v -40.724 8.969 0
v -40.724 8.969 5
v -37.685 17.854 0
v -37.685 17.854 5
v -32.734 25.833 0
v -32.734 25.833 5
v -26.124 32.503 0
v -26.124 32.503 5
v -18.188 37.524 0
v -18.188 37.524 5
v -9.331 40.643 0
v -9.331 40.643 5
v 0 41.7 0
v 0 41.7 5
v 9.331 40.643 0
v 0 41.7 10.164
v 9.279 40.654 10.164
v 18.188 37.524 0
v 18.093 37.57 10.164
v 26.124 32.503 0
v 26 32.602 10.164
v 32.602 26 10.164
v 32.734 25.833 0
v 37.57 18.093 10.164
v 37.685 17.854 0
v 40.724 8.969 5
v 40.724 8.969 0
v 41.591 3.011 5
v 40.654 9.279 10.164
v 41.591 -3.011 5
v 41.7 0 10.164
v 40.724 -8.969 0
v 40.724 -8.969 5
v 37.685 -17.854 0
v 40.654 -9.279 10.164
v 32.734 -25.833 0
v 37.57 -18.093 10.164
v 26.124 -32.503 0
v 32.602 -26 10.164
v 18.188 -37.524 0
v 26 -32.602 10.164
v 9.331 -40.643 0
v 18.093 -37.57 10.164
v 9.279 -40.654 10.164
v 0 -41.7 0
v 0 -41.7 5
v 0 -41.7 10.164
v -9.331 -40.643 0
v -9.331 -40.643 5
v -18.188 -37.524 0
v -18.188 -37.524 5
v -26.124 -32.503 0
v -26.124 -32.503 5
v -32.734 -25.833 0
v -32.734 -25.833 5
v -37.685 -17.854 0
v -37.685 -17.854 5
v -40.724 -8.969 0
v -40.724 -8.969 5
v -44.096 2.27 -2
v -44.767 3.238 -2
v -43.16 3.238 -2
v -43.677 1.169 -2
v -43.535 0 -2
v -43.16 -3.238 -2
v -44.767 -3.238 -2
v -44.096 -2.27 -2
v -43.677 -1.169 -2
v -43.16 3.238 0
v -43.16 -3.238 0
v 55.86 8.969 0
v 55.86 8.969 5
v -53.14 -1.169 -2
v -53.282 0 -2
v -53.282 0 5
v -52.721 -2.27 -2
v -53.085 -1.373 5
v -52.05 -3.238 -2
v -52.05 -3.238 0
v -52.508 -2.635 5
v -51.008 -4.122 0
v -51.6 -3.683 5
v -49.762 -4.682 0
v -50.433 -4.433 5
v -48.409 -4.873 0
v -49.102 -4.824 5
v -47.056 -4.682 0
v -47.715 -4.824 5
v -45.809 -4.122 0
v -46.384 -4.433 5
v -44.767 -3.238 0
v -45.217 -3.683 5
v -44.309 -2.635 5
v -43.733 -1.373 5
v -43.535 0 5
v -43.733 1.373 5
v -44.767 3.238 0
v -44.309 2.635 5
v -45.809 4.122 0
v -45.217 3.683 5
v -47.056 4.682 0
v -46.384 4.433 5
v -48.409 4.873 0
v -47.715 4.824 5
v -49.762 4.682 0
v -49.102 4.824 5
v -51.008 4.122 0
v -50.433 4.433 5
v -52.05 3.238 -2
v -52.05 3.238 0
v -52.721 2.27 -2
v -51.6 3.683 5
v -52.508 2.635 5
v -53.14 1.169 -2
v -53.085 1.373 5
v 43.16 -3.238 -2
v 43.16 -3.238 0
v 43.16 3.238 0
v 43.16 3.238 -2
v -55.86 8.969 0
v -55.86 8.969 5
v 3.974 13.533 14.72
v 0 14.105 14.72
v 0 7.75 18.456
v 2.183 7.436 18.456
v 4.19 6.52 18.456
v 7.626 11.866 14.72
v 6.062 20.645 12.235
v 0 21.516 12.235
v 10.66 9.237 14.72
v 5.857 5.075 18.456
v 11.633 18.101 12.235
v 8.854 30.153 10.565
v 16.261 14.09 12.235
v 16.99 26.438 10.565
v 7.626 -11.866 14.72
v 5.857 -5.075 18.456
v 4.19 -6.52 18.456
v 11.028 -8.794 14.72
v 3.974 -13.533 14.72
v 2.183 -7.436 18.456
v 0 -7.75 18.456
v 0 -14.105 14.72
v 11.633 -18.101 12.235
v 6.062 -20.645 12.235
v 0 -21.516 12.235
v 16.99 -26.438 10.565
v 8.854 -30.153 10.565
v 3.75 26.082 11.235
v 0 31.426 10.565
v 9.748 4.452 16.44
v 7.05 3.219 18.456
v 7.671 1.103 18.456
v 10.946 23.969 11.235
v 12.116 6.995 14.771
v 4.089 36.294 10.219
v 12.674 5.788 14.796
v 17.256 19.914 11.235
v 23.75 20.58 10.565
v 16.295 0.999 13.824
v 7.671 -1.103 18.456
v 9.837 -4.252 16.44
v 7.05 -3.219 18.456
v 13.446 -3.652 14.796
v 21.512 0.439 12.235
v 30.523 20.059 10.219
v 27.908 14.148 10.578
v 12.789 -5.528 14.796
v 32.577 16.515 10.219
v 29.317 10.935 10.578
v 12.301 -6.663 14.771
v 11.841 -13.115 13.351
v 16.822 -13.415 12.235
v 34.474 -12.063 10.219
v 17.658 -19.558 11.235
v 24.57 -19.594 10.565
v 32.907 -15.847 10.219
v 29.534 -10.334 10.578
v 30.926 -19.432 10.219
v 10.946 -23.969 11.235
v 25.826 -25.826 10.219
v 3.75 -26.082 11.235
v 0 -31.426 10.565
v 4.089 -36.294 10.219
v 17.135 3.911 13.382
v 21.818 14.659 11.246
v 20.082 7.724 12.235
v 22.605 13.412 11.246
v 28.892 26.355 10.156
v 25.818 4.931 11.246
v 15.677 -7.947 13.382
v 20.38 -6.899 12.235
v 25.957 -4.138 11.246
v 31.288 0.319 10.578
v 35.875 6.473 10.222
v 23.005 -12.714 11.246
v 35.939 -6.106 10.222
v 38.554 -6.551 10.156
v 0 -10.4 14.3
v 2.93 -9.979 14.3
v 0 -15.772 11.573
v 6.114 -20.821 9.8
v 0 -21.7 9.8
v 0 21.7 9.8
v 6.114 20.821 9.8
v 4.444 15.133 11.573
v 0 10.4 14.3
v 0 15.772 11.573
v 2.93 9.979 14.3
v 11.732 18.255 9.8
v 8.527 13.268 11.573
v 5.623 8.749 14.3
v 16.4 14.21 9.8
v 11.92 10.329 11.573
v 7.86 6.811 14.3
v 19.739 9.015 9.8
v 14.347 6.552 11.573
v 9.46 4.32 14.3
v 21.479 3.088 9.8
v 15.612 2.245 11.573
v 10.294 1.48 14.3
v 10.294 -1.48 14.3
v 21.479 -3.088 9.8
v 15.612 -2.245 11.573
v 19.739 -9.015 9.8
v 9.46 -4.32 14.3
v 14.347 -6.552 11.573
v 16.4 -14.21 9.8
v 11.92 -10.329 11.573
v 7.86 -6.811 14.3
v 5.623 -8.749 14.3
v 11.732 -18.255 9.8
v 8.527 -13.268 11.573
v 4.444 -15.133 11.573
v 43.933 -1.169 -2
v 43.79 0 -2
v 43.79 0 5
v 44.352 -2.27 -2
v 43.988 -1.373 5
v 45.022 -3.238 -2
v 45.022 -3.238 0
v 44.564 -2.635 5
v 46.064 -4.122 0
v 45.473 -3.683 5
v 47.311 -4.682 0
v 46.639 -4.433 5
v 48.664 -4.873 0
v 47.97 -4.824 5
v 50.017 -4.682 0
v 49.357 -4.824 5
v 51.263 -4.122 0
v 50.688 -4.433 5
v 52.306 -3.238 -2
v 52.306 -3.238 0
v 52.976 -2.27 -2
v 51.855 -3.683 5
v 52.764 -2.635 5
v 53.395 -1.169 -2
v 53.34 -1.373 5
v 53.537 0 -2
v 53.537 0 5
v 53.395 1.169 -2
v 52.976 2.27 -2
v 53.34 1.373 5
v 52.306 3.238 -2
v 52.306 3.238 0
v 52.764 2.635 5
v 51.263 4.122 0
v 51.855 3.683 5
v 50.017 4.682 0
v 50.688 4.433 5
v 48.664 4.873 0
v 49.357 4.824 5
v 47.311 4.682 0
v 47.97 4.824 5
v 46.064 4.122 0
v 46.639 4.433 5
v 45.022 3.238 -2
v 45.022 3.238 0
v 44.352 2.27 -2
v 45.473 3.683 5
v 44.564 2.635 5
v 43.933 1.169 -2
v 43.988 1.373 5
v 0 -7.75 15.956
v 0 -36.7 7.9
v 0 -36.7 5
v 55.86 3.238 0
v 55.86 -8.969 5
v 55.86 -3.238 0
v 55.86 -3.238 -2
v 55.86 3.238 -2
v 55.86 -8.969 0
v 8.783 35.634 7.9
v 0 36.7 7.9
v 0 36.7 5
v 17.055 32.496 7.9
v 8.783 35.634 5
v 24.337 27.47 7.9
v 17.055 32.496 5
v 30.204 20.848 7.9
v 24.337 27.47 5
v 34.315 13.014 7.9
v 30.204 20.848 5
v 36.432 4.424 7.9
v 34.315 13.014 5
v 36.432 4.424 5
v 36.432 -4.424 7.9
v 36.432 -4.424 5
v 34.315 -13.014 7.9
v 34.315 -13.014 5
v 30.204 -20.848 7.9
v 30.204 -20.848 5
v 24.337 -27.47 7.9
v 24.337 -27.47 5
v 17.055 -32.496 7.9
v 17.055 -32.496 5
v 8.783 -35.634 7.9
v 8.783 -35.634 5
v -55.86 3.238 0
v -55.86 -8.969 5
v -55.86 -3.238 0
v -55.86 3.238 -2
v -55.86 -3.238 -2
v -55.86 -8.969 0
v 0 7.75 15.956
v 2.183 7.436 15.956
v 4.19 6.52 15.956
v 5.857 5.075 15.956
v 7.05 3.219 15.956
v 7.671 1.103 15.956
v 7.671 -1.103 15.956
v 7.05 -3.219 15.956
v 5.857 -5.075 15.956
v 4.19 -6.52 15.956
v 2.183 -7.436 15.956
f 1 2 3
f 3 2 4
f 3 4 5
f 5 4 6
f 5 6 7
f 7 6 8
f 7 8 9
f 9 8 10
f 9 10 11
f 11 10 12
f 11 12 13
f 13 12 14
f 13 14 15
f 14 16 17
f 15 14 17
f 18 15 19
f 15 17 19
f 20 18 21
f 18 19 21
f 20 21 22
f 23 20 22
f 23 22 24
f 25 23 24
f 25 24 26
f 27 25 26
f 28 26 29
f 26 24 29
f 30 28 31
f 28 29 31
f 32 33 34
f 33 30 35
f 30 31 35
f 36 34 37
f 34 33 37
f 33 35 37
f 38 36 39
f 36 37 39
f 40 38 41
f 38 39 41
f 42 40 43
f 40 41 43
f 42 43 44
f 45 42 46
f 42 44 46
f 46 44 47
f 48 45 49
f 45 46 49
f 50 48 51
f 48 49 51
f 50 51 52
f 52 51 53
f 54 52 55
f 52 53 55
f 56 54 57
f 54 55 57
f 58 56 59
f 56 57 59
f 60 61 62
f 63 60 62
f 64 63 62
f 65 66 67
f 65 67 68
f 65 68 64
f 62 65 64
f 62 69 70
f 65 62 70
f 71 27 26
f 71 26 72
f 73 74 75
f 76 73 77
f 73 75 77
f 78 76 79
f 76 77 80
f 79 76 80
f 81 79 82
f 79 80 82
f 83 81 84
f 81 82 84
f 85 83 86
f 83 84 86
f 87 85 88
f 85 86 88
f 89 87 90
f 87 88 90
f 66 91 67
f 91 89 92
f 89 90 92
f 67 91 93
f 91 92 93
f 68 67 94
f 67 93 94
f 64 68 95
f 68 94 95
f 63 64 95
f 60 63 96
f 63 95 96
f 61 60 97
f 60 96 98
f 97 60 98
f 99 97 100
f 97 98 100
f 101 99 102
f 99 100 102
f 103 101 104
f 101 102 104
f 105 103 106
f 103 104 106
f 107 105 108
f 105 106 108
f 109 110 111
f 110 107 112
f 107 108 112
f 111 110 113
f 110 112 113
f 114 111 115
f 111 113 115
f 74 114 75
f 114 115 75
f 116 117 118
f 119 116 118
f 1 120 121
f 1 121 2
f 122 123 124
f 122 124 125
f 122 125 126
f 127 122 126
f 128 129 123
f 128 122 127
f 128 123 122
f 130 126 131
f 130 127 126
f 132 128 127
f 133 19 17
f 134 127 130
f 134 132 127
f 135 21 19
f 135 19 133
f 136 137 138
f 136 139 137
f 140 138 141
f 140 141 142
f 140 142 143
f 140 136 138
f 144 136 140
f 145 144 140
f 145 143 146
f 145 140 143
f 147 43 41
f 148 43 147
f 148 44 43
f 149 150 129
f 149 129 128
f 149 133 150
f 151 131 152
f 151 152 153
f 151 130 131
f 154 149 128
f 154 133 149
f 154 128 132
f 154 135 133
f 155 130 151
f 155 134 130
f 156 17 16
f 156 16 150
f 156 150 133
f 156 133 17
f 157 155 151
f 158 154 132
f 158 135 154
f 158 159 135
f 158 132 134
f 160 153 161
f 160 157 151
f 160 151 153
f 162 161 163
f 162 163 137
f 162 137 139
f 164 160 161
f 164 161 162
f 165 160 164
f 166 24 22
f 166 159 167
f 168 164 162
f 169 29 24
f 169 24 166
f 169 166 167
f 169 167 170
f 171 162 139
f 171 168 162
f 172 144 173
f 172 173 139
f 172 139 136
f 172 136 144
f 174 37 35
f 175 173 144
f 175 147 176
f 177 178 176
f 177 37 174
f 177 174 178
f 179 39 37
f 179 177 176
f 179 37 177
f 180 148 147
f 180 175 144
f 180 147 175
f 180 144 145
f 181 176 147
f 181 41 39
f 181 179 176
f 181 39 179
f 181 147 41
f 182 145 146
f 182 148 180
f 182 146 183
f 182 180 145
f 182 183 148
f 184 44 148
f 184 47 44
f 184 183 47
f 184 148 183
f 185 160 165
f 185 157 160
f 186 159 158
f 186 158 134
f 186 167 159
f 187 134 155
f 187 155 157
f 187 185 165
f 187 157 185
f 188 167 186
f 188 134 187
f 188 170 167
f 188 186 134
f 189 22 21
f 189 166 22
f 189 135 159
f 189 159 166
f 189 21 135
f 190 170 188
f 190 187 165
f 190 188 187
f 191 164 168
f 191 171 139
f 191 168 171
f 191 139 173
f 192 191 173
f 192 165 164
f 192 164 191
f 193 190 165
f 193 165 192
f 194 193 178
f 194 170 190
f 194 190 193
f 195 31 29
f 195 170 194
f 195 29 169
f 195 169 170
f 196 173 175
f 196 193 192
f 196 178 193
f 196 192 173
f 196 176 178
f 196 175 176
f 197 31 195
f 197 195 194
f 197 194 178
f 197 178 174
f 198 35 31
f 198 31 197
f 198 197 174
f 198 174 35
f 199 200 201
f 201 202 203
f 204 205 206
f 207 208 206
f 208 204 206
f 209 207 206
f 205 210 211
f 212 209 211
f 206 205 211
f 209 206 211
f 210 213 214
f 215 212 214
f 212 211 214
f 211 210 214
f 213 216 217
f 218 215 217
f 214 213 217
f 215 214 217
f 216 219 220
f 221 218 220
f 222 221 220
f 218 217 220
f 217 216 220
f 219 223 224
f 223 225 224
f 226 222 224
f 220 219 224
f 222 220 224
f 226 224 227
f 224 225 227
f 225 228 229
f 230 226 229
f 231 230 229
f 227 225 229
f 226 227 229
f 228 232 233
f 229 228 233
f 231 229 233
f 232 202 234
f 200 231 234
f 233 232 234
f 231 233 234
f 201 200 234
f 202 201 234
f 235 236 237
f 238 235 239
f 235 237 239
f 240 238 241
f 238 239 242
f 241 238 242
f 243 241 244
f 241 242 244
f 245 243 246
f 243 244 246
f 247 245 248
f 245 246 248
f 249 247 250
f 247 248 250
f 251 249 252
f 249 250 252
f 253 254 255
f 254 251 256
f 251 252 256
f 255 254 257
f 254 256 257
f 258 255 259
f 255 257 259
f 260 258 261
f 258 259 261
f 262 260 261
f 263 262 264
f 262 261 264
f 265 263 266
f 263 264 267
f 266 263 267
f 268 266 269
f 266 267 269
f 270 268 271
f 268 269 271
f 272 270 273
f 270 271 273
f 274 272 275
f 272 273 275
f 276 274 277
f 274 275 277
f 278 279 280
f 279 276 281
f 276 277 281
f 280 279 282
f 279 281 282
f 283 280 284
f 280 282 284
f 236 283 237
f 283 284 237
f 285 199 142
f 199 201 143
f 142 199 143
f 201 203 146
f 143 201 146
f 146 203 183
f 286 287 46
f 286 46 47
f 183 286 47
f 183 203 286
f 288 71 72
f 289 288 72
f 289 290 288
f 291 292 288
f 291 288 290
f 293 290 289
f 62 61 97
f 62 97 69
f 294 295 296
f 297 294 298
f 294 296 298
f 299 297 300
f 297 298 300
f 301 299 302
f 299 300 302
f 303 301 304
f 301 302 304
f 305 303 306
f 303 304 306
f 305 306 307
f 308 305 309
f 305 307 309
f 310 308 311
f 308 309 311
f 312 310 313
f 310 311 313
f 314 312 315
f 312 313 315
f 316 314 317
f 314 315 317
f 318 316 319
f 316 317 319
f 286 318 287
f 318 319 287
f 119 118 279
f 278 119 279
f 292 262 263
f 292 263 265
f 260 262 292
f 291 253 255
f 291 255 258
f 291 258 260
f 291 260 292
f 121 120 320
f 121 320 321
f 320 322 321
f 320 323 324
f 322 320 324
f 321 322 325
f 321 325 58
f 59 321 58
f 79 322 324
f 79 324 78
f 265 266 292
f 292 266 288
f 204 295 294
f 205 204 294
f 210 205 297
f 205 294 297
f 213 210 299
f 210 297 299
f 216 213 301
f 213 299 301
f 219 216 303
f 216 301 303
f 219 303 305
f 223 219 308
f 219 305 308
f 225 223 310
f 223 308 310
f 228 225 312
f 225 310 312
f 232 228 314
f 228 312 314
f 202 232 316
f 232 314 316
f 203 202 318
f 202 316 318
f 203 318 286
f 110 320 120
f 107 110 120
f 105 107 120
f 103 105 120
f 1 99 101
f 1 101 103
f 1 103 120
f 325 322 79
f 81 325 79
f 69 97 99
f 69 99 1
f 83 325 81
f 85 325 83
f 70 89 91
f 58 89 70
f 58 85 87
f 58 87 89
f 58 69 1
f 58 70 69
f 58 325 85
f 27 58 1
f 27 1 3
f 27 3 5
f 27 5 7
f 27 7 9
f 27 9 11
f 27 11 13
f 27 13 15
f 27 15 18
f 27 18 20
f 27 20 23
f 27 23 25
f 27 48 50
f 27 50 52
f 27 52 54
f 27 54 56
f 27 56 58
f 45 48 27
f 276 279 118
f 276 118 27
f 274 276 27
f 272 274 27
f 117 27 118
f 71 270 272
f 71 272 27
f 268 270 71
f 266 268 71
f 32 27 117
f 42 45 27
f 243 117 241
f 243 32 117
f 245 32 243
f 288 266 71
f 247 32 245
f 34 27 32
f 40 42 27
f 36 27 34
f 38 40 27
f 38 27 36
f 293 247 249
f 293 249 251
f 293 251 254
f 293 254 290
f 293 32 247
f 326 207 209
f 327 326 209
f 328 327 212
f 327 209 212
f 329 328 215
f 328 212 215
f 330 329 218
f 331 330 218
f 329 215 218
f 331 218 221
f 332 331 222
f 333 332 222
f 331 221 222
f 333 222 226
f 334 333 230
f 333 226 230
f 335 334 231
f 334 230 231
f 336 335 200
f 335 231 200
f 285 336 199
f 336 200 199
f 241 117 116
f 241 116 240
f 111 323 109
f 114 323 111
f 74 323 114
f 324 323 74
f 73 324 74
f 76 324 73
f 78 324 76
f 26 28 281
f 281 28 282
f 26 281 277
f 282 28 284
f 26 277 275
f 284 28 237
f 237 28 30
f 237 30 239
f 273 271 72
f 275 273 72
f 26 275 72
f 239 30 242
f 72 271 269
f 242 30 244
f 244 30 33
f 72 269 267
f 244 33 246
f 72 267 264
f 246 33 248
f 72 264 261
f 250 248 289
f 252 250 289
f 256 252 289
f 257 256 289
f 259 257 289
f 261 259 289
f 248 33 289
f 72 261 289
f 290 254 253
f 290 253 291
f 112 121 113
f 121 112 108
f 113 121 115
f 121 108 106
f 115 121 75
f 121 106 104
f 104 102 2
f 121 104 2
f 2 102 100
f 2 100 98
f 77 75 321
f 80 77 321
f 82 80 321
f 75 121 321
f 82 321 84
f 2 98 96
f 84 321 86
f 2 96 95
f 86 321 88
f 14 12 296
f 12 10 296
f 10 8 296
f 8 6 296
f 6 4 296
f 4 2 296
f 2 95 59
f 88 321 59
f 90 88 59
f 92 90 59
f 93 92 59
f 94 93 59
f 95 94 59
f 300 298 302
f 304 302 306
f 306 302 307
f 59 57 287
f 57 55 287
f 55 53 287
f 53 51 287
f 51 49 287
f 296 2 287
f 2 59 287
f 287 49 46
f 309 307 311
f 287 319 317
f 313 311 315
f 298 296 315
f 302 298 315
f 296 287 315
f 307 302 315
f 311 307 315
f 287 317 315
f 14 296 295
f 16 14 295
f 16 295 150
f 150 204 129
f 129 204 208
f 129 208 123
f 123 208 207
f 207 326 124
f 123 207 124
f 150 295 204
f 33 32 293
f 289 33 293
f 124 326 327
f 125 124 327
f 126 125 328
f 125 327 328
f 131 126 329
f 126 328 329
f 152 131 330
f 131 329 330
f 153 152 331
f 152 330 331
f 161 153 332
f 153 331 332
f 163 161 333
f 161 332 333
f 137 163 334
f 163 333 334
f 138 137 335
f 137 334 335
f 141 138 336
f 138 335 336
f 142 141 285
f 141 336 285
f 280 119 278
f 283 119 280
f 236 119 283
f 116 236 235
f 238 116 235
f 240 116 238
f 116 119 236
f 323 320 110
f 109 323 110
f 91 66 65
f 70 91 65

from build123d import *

# Parameters (mm, degrees)
F3_DEPTH  = 50.8
F5_DEPTH  = 25.4
F7_DEPTH  = 5
F8_W      = 15.135864
F8_H      = 17.9375
F9_DEPTH  = 5
F10_W     = 12.7
F10_H     = 3.2385
F11_DEPTH = 2
F13_DEPTH = 25.4


with BuildPart() as f1:
    # F0 (on Front) → F1 (revolve)
    with BuildSketch(Plane.XZ):
        with BuildLine():
            Line((0, 5), (0, 0))
            Line((0, 0), (41.7, 0))
            Line((41.7, 0), (41.7, 10.163587))
            add(Edge.make_bspline(
                [(7.75, 18.455775), (15.354575, 12.432687), (28.510841, 9.94407), (41.7, 10.163587)],
                knots=[0, 0, 0, 0, 34.948003, 34.948003, 34.948003, 34.948003], degree=3))
            Line((7.75, 18.455775), (7.75, 15.955775))
            add(Edge.make_bspline(
                [(7.75, 15.955775), (8.670718, 15.370223), (9.53974, 14.818877), (10.4, 14.3)],
                knots=[0, 0, 0, 0, 4.090011, 4.090011, 4.090011, 4.090011], degree=3))
            add(Edge.make_bspline(
                [(10.4, 14.3), (13.56972, 12.388142), (16.620486, 10.917097), (21.7, 9.8)],
                knots=[4.090011, 4.090011, 4.090011, 4.090011, 19.160091, 19.160091, 19.160091, 19.160091], degree=3))
            add(Edge.make_bspline(
                [(21.7, 9.8), (25.370522, 8.992771), (30.100394, 8.370363), (36.7, 7.9)],
                knots=[19.160091, 19.160091, 19.160091, 19.160091, 30.049925, 30.049925, 30.049925, 30.049925], degree=3))
            Line((36.7, 7.9), (36.7, 5))
            Line((36.7, 5), (21.7, 5))
            Line((21.7, 5), (10.4, 5))
            Line((10.4, 5), (0, 5))
        make_face()
    revolve(axis=Axis((0, 0, 2.5), (0, 0, -1)))

    # F2 (on Front) → F3 (cut, symmetric)
    with BuildSketch(Plane.XZ):
        Polygon((0, 5), (0, 50.867478), (-90.82243, 44.18689), (-90.82243, 5), align=None)
    extrude(amount=F3_DEPTH, both=True, mode=Mode.SUBTRACT)

    # F4 (on Top) → F5 (cut)
    with BuildSketch(Plane.XY):
        Polygon((0, -4.69055), (0, 4.69055), (-12.84133, 12.104495), (-12.84133, -12.104495), align=None)
    extrude(amount=F5_DEPTH, mode=Mode.SUBTRACT)

    # F6 (on face) → F7 (join)
    with BuildSketch(Plane(origin=(0, 0, 0), x_dir=(1, 0, 0), z_dir=(0, 0, -1))):
        Polygon((0, -4.69055), (0, 4.69055), (-12.84133, 12.104495), (-12.84133, -12.104495), align=None)
    extrude(amount=-F7_DEPTH)

    # F8 (on face) → F9 (join)
    with BuildSketch(Plane(origin=(0, 0, 0), x_dir=(1, 0, 0), z_dir=(0, 0, -1))):
        with Locations((-48.292022, 0)):
            Rectangle(F8_W, F8_H)
        with Locations((48.292022, 0)):
            Rectangle(F8_W, F8_H)
    extrude(amount=-F9_DEPTH)

    # F10 (on face) → F11 (join)
    with BuildSketch(Plane(origin=(0, 0, 0), x_dir=(1, 0, 0), z_dir=(0, 0, -1))):
        with Locations((49.509954, 1.61925)):
            Rectangle(F10_W, F10_H)
        with Locations((49.509954, -1.61925)):
            Rectangle(F10_W, F10_H)
        with Locations((-49.509954, -1.61925)):
            Rectangle(F10_W, F10_H)
        with Locations((-49.509954, 1.61925)):
            Rectangle(F10_W, F10_H)
    extrude(amount=F11_DEPTH)

    # F12 (on face) → F13 (cut)
    with BuildSketch(Plane.XY.offset(5)):
        with BuildLine():
            Line((-53.282022, 0), (-43.535147, 0))
            ThreePointArc((-43.535147, 0), (-48.408585, 4.873438), (-53.282022, 0))
        make_face()
        with BuildLine():
            ThreePointArc((-53.282022, 0), (-48.408585, -4.873438), (-43.535147, 0))
            Line((-43.535147, 0), (-53.282022, 0))
        make_face()
        with BuildLine():
            Line((43.790486, 0), (53.537361, 0))
            ThreePointArc((53.537361, 0), (48.663924, 4.873438), (43.790486, 0))
        make_face()
        with BuildLine():
            ThreePointArc((43.790486, 0), (48.663924, -4.873438), (53.537361, 0))
            Line((53.537361, 0), (43.790486, 0))
        make_face()
    extrude(amount=-F13_DEPTH, mode=Mode.SUBTRACT)


solid = f1.part
